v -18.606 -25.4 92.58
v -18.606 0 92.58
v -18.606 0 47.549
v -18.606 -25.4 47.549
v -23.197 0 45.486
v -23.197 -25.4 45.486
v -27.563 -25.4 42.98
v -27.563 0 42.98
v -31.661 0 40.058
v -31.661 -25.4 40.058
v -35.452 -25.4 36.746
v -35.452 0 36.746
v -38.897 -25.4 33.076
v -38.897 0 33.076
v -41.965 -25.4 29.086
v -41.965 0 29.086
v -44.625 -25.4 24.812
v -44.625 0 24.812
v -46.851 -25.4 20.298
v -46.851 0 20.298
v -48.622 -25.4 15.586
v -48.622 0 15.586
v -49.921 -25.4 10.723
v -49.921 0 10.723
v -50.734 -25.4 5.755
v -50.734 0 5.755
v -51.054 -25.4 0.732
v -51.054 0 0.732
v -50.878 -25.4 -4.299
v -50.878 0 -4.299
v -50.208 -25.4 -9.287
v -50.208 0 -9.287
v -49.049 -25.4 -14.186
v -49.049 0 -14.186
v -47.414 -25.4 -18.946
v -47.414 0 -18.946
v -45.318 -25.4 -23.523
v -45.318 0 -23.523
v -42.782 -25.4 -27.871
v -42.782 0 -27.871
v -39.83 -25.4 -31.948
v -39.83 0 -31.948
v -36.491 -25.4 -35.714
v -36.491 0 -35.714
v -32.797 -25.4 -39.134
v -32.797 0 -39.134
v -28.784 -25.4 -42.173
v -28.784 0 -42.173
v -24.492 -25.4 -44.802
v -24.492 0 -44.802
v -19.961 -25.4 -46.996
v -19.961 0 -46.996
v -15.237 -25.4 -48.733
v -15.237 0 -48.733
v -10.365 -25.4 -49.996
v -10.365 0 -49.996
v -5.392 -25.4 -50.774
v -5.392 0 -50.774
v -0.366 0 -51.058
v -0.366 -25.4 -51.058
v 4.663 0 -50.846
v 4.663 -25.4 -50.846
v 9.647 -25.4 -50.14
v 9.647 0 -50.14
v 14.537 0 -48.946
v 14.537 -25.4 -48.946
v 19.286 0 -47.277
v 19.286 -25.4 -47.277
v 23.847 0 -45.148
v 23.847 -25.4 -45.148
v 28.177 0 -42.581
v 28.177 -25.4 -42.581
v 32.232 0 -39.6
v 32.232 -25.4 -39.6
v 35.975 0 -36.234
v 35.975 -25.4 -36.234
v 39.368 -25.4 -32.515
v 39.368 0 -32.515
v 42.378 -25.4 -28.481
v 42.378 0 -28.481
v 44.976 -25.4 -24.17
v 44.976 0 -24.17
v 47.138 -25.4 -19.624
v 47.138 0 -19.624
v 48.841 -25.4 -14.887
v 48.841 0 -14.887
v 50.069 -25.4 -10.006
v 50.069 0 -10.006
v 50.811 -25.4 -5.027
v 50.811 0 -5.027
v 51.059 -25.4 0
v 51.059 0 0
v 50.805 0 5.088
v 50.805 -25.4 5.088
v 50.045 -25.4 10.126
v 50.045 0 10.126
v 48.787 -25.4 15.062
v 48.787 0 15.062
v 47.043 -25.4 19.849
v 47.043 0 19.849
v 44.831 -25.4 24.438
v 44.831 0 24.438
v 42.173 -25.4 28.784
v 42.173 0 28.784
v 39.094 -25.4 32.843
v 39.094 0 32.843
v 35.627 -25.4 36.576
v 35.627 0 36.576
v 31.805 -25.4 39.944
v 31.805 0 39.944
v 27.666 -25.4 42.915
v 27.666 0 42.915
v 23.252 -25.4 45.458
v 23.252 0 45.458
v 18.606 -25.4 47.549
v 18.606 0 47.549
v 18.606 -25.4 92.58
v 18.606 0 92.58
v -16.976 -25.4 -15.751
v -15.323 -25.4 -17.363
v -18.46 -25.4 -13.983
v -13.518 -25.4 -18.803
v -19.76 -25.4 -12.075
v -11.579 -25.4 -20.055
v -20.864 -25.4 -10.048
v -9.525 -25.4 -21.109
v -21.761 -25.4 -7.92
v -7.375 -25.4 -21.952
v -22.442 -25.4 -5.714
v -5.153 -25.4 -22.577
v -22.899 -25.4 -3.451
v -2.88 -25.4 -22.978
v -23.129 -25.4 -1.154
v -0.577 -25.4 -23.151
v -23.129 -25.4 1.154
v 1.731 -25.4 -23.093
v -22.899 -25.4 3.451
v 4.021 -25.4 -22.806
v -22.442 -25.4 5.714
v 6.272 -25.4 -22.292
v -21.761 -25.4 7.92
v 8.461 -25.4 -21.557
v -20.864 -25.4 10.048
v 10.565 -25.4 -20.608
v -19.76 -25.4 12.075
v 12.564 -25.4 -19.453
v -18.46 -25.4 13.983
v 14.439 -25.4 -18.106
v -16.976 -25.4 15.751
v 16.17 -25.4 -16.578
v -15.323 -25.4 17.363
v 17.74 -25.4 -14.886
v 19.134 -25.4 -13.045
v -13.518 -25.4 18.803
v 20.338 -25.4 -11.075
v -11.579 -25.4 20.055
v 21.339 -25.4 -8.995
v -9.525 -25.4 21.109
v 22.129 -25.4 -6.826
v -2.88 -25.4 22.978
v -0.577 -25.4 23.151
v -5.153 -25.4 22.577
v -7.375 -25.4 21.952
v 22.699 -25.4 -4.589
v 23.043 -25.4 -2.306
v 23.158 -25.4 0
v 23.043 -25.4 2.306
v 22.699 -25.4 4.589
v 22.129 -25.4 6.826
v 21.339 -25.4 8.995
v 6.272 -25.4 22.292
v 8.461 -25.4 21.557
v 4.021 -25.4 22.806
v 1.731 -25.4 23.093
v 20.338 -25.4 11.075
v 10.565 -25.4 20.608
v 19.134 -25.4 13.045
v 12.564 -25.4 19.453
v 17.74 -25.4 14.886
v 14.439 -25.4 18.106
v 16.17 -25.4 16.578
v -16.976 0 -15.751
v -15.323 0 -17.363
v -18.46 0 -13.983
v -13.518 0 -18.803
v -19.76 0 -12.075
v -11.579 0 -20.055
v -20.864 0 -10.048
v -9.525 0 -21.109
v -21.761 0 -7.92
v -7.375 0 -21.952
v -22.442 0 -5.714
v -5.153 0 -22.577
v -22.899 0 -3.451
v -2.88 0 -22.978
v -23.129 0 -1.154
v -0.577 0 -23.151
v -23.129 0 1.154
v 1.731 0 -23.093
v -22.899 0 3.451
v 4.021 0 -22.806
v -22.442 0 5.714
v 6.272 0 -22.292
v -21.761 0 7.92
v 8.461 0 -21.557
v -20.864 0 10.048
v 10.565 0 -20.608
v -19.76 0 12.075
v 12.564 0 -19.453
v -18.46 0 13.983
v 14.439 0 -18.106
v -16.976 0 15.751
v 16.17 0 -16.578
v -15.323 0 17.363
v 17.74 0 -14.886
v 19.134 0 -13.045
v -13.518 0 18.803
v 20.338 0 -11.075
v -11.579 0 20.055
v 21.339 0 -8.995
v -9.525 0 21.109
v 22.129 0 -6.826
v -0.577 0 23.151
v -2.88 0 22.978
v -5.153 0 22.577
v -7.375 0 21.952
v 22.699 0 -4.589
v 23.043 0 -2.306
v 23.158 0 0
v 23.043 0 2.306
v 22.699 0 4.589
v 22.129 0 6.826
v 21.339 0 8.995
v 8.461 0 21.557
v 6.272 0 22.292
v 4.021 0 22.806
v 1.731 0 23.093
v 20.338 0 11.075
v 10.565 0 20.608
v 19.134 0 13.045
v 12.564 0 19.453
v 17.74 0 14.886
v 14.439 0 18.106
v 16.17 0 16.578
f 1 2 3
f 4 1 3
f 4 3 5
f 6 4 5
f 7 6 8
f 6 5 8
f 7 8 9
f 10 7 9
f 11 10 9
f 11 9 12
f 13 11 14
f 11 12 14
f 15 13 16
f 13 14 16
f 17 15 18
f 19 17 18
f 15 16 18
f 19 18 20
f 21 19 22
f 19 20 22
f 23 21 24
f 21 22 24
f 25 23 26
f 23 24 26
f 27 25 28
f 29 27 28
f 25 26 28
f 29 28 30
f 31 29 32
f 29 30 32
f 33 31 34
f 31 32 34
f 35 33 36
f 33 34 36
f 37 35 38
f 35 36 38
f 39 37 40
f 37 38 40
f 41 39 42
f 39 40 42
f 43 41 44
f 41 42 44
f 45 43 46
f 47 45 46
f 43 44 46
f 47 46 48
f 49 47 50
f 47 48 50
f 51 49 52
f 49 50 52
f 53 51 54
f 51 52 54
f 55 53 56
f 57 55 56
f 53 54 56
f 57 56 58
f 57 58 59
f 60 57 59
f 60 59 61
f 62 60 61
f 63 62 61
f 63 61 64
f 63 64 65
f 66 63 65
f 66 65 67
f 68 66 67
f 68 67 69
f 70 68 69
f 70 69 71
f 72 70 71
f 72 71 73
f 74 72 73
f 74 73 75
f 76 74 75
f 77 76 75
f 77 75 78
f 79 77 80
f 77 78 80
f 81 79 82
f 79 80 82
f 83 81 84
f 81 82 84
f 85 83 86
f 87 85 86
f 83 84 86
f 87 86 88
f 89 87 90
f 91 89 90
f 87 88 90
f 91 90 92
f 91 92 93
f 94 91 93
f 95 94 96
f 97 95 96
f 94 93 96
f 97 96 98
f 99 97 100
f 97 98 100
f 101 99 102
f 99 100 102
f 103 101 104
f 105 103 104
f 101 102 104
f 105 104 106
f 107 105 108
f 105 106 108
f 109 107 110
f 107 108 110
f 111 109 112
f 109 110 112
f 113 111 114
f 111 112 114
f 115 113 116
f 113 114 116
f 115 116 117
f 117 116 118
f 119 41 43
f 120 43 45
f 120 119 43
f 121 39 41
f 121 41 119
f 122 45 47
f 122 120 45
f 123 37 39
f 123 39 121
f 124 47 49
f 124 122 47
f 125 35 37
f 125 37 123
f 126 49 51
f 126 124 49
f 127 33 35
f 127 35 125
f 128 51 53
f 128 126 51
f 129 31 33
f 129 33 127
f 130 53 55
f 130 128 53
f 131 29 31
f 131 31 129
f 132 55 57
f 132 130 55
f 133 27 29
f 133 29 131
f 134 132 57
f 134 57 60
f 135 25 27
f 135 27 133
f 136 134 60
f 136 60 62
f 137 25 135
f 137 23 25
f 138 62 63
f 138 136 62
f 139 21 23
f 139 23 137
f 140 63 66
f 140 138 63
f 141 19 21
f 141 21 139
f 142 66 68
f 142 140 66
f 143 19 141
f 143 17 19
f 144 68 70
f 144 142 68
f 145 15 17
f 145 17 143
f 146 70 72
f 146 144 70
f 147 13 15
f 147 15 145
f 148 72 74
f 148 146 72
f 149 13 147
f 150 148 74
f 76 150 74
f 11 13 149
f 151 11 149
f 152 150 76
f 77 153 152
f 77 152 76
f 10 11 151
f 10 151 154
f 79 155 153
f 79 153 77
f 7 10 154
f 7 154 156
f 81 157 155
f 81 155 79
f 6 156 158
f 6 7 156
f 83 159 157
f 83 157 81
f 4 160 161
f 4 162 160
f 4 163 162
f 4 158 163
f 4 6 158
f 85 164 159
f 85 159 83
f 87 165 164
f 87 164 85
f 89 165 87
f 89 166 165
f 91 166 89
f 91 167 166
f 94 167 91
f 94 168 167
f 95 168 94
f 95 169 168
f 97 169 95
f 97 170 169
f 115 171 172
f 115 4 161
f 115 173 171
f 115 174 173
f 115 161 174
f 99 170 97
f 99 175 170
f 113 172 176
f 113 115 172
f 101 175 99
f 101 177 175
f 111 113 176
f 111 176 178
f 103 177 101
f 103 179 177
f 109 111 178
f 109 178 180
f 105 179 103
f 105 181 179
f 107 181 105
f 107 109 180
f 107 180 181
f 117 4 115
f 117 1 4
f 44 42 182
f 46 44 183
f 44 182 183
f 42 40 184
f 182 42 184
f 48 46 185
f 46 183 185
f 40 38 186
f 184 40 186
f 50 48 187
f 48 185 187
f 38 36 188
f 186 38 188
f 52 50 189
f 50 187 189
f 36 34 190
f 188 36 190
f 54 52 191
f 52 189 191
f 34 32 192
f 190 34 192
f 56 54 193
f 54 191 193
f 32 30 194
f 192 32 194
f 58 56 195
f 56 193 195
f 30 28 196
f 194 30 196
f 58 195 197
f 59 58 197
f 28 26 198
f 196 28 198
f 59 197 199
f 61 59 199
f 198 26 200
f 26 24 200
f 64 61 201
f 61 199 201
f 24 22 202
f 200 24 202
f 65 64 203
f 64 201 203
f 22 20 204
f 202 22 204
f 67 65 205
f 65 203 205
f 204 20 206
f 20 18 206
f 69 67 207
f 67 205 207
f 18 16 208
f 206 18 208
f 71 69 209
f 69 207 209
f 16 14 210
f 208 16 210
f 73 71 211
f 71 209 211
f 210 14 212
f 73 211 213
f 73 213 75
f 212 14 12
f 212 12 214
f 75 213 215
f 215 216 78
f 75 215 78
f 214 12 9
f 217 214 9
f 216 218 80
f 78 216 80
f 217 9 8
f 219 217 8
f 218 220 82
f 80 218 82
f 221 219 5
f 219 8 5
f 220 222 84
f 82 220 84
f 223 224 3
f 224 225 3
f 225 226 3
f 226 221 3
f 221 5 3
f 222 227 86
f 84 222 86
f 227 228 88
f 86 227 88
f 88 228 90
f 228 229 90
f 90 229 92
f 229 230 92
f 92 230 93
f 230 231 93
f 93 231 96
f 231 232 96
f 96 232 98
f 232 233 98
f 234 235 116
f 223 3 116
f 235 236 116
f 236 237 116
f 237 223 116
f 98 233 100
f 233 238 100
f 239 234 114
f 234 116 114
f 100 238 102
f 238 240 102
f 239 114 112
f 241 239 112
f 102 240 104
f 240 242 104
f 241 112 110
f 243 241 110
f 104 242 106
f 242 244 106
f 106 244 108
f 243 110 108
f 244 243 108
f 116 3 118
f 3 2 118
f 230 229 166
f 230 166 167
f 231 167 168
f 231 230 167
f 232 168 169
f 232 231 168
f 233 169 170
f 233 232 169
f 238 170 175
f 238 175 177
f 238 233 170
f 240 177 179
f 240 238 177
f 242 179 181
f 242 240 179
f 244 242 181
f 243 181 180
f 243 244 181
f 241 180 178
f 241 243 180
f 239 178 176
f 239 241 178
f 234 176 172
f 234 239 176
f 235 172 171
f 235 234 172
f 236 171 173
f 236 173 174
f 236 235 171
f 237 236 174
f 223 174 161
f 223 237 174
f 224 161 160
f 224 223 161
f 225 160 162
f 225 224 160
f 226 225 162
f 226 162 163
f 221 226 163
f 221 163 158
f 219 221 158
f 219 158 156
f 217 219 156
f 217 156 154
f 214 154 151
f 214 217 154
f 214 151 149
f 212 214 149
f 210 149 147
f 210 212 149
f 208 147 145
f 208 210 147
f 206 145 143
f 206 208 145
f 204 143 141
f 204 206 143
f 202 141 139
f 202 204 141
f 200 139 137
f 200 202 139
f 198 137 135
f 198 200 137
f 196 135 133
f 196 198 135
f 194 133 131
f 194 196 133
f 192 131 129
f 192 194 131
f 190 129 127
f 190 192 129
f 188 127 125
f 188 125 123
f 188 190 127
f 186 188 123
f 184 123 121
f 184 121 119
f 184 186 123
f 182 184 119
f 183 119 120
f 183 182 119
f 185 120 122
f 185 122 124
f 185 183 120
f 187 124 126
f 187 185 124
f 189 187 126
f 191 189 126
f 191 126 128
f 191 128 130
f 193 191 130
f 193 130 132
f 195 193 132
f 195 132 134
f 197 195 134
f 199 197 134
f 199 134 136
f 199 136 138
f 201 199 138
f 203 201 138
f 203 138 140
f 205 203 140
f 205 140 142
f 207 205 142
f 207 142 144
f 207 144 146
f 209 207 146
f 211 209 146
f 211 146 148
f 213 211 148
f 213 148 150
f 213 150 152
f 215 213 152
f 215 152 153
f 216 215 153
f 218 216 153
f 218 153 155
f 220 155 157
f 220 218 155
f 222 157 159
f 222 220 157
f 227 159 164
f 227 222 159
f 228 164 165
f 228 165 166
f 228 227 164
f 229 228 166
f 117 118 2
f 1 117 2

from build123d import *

# Parameters (mm, degrees)
F0_R     = 23.1578344668
F1_DEPTH = 25.4


with BuildPart() as f1:
    # F0 (on Front) → F1 (new body)
    with BuildSketch(Plane.XZ):
        with BuildLine():
            ThreePointArc((-18.6059433036, 47.5486456469), (-28.7840919078, -42.1726319087), (51.059326563, 0))
            ThreePointArc((51.059326563, 0), (42.1726319087, 28.7840919078), (18.6059433036, 47.5486456469))
            Line((18.6059433036, 47.5486456469), (18.6059433036, 40.709229527))
            Line((18.6059433036, 40.709229527), (-18.6059433036, 40.709229527))
            Line((-18.6059433036, 40.709229527), (-18.6059433036, 47.5486456469))
        make_face()
        Circle(F0_R, mode=Mode.SUBTRACT)
        with BuildLine():
            Line((18.6059433036, 40.709229527), (18.6059433036, 47.5486456469))
            ThreePointArc((18.6059433036, 47.5486456469), (0, 51.059326563), (-18.6059433036, 47.5486456469))
            Line((-18.6059433036, 47.5486456469), (-18.6059433036, 40.709229527))
            Line((-18.6059433036, 40.709229527), (18.6059433036, 40.709229527))
        make_face()
        with BuildLine():
            ThreePointArc((-18.6059433036, 47.5486456469), (0, 51.059326563), (18.6059433036, 47.5486456469))
            Line((18.6059433036, 47.5486456469), (18.6059433036, 92.5802945773))
            Line((18.6059433036, 92.5802945773), (-18.6059433036, 92.5802945773))
            Line((-18.6059433036, 92.5802945773), (-18.6059433036, 47.5486456469))
        make_face()
    extrude(amount=F1_DEPTH)


solid = f1.part
